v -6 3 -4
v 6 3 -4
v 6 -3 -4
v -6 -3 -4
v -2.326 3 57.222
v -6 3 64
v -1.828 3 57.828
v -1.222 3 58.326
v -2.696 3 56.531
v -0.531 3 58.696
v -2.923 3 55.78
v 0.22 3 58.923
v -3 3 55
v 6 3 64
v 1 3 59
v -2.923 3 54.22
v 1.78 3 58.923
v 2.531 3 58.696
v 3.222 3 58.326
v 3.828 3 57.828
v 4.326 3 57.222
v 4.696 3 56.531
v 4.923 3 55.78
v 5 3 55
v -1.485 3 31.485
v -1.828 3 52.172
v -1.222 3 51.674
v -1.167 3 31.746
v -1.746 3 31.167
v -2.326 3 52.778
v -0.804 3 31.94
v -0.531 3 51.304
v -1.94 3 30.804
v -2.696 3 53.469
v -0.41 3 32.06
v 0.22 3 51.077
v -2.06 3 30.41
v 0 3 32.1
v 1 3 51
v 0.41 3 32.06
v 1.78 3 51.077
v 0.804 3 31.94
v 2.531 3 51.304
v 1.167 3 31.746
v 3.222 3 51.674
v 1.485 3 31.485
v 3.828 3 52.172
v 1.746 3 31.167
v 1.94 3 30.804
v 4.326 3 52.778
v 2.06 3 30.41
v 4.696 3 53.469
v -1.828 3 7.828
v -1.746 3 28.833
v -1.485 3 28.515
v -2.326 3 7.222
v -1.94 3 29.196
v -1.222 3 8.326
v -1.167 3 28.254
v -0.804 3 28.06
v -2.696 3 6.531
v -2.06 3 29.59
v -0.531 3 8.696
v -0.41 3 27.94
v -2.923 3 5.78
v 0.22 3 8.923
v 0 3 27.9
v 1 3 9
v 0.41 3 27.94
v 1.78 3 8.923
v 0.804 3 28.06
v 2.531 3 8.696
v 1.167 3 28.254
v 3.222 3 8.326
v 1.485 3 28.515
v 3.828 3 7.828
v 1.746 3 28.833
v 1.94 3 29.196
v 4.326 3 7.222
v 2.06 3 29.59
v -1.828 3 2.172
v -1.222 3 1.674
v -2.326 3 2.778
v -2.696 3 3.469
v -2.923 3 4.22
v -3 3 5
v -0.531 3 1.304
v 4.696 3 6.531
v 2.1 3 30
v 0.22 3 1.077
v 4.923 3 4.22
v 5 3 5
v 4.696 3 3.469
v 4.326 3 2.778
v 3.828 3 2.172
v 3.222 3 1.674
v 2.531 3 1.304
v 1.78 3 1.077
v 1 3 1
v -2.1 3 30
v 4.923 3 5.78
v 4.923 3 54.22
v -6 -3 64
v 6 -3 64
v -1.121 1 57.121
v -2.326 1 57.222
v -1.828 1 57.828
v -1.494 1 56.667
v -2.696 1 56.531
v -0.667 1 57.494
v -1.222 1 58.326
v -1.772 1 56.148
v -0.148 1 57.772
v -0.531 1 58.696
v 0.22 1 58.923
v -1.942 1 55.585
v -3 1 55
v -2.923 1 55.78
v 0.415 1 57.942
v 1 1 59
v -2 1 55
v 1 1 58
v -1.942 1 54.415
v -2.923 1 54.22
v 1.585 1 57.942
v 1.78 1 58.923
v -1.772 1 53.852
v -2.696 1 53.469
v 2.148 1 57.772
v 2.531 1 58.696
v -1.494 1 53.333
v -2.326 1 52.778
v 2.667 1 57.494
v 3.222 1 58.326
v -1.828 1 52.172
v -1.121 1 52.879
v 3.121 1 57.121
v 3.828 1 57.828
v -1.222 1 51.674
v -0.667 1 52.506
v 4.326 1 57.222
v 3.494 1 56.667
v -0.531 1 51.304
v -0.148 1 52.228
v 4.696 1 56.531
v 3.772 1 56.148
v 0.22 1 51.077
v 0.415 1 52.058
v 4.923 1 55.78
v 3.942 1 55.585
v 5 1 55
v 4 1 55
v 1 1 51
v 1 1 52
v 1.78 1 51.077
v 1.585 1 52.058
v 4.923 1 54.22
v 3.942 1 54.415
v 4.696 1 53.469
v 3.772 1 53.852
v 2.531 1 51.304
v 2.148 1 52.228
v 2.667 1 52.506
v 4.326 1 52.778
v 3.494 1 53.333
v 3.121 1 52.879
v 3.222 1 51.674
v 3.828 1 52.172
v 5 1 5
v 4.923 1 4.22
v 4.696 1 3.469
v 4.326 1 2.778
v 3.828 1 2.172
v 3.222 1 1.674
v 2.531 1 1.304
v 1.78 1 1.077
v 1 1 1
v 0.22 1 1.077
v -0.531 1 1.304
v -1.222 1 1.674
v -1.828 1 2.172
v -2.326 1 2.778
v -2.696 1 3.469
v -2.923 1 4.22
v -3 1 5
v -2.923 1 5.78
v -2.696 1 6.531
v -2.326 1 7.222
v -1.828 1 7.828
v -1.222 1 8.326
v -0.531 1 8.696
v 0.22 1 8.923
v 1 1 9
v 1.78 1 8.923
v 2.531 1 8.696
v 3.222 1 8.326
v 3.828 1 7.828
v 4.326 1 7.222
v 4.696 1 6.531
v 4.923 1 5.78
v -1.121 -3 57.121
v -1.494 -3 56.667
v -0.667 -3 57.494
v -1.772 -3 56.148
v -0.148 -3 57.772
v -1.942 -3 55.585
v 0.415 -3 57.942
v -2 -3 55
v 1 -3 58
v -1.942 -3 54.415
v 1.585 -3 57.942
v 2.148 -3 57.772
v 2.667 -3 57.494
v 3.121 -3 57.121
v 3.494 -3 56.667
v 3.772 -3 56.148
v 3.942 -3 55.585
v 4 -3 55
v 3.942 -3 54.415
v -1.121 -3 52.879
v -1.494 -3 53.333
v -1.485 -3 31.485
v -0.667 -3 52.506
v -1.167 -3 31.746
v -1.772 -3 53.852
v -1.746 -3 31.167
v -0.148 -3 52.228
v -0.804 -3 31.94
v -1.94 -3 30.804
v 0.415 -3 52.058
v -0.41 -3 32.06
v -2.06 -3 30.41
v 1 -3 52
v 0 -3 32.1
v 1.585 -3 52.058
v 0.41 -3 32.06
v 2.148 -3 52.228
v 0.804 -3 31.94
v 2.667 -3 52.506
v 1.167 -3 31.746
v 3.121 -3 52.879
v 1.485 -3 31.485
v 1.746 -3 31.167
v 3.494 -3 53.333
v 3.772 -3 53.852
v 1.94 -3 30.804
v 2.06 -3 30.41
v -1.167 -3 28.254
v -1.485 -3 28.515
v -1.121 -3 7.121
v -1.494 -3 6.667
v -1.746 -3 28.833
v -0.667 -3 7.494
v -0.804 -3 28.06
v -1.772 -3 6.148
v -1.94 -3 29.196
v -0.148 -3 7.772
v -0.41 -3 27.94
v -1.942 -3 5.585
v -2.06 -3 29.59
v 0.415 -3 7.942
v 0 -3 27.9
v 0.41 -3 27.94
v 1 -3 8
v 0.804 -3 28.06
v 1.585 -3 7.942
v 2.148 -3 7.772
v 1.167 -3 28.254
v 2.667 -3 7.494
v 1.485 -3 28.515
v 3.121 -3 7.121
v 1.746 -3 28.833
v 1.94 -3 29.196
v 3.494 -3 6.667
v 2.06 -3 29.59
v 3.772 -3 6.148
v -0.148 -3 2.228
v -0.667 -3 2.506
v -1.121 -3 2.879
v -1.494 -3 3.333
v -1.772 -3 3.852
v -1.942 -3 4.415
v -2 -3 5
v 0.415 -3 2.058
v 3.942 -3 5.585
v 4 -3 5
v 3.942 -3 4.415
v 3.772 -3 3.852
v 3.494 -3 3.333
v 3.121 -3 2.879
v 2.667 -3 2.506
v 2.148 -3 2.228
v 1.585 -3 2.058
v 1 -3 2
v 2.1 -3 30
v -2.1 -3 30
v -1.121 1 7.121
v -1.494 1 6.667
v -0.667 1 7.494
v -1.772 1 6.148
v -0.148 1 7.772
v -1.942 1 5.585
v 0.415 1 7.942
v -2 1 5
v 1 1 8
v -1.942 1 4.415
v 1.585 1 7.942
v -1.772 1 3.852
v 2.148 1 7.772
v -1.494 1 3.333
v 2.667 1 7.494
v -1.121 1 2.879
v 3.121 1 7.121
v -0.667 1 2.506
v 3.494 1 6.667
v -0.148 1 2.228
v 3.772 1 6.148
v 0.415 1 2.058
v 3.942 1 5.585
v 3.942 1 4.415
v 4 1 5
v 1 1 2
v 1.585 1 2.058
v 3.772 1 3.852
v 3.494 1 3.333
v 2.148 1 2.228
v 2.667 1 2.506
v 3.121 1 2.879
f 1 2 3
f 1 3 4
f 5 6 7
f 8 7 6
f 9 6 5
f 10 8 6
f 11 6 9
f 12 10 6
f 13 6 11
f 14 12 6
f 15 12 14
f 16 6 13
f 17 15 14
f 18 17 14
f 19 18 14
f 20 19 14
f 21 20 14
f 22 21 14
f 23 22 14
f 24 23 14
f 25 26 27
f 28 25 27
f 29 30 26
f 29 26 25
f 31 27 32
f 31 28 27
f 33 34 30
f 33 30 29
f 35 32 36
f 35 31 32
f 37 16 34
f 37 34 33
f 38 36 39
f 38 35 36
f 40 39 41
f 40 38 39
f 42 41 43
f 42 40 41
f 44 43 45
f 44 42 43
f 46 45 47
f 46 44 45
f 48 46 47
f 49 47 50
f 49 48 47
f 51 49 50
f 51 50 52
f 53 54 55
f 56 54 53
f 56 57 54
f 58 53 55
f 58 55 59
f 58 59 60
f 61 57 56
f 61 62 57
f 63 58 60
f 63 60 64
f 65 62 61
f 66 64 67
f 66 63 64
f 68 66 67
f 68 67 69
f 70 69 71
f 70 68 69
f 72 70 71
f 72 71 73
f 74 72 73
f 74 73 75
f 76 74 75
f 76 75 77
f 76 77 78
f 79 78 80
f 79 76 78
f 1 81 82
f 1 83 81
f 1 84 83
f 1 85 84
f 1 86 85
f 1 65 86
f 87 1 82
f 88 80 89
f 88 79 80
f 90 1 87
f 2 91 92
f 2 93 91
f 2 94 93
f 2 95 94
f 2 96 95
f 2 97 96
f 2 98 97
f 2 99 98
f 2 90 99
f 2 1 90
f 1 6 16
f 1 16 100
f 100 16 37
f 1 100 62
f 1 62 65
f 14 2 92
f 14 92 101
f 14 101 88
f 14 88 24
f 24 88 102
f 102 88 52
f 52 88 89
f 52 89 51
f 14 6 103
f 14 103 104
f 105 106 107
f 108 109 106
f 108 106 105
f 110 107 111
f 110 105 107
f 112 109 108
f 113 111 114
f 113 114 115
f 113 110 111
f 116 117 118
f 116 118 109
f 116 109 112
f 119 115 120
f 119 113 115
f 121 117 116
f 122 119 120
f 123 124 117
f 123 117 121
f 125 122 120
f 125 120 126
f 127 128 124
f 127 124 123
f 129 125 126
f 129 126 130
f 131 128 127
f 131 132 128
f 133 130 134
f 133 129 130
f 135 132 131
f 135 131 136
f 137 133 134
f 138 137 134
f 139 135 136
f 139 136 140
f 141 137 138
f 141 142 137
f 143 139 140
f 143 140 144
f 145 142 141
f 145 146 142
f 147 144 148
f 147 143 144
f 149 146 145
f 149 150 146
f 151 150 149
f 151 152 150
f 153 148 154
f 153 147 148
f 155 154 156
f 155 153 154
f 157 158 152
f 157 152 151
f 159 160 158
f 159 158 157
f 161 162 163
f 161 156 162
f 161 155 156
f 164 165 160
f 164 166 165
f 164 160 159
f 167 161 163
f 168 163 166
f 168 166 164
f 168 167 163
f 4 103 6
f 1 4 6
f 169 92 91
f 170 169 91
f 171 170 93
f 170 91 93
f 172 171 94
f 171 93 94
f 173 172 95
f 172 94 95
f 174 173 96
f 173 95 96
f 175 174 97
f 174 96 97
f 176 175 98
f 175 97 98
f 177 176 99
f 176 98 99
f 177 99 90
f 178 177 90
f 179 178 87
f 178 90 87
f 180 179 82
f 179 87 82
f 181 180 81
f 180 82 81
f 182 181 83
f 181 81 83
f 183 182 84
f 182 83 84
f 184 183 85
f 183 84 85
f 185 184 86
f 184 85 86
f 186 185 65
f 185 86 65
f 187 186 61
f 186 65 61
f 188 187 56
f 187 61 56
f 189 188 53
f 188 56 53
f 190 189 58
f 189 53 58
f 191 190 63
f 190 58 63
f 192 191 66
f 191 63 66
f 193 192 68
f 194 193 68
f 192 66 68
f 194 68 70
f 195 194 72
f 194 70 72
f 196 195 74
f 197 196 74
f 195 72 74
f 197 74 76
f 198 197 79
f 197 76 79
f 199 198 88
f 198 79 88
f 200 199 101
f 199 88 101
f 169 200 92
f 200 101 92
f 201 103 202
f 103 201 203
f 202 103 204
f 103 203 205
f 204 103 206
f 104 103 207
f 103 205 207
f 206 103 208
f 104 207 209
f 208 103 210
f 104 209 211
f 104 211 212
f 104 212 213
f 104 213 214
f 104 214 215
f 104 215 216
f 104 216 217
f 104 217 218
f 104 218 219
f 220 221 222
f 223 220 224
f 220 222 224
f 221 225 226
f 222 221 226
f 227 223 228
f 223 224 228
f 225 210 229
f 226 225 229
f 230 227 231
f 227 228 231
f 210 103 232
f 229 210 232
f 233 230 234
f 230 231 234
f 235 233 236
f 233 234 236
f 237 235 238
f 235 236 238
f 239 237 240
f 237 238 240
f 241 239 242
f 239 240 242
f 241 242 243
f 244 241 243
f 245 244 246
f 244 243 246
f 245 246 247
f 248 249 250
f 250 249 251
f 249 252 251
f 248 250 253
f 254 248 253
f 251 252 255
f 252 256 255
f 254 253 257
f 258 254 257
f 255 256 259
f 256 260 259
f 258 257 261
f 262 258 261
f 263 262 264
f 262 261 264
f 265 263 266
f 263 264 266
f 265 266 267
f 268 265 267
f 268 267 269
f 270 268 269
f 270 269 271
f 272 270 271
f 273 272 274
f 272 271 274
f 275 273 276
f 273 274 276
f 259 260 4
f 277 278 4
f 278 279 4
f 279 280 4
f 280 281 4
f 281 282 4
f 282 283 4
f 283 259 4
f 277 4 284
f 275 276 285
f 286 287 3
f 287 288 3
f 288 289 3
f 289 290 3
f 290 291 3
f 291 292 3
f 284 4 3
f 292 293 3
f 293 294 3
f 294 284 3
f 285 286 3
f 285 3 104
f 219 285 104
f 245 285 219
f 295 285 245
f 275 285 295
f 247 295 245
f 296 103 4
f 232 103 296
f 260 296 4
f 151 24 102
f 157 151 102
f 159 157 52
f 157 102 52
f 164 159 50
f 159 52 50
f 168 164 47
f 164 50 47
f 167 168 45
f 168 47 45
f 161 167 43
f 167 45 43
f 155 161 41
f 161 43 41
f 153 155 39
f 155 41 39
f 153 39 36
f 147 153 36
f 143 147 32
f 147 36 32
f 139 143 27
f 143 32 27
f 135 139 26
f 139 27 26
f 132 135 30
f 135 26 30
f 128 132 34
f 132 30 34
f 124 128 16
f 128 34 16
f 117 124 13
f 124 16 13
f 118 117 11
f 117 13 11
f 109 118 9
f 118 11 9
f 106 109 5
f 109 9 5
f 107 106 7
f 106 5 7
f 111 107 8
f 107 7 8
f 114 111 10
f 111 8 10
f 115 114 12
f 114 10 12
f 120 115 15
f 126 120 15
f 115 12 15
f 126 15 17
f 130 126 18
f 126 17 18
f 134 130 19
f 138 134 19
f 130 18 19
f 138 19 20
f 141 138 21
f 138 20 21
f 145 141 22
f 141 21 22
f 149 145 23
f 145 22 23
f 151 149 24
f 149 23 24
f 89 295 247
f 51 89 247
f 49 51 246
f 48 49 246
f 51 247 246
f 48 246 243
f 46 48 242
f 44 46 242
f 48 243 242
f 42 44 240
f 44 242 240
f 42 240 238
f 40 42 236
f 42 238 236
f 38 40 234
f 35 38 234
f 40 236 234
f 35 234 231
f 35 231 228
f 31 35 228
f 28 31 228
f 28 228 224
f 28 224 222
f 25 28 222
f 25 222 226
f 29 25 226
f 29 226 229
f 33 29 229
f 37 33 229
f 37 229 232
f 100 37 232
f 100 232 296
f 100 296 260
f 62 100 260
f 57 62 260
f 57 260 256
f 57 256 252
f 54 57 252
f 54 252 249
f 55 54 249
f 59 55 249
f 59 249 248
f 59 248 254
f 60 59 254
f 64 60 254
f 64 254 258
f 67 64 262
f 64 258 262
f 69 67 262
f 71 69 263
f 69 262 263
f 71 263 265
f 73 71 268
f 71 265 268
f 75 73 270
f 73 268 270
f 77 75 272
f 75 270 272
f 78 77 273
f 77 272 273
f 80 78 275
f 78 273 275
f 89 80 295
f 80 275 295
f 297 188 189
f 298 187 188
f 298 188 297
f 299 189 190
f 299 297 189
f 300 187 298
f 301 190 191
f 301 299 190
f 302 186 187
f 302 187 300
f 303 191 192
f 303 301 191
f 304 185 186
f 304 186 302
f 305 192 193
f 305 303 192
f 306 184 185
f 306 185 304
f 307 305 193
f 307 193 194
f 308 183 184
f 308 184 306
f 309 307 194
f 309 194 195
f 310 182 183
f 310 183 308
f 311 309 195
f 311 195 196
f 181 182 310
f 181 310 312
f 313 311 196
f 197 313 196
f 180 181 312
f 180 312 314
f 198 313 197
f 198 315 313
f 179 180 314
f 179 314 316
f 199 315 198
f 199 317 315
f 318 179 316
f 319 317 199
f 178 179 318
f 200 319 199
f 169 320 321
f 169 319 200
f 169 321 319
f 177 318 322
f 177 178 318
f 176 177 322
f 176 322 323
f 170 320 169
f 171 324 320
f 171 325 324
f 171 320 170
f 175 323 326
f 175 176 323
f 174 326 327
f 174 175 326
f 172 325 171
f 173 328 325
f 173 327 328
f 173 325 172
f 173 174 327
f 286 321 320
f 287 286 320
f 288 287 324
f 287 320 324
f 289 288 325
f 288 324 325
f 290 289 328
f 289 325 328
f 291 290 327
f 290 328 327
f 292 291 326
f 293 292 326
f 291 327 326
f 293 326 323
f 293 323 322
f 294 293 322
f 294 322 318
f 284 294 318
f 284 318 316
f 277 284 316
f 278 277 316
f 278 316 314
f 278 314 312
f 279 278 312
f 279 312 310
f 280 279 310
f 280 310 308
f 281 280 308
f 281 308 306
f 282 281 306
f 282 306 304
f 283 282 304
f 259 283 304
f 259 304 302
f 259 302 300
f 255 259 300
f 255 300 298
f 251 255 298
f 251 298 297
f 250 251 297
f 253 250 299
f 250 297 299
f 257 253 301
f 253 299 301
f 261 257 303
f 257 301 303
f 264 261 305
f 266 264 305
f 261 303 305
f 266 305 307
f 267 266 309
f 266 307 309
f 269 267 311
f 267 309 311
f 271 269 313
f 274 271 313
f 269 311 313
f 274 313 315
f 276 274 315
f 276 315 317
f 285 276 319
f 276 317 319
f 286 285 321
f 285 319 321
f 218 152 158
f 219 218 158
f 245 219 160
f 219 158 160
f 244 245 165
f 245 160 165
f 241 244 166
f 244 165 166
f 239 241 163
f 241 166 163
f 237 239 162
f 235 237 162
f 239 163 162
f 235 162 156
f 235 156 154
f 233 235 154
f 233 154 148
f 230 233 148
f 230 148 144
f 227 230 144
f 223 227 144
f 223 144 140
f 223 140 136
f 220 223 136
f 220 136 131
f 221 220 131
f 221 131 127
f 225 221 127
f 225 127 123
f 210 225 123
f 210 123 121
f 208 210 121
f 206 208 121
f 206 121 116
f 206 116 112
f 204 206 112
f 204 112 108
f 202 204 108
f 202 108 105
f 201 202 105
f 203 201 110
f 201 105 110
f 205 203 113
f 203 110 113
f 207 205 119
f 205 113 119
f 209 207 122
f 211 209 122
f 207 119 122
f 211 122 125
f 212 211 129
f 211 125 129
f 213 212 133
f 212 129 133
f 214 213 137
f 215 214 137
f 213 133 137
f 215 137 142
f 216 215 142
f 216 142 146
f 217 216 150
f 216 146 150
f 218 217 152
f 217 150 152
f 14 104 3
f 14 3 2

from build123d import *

# Parameters (mm, degrees)
SKETCH1_W             = 12
SKETCH1_H             = 6
BOSS_EXTRUDE1_DEPTH   = 60
SKETCH2_R             = 3
CUT_EXTRUDE1_DEPTH    = 7
SKETCH3_R             = 4
CUT_EXTRUDE2_DEPTH    = 2
SKETCH4_W             = 12
SKETCH4_H             = 6
BOSS_EXTRUDE2_DEPTH   = 4
SKETCH5_W             = 12
SKETCH5_H             = 6
BOSS_EXTRUDE3_DEPTH   = 4
M5_TAPPED_HOLE1_D     = 4.2
M5_TAPPED_HOLE1_DEPTH = 52
M5_TAPPED_HOLE1_TIP   = 1.2618073


with BuildPart() as part:
    # Sketch1 → Boss-Extrude1 (new body)
    with BuildSketch(Plane.XY):
        Rectangle(SKETCH1_W, SKETCH1_H)
    extrude(amount=BOSS_EXTRUDE1_DEPTH)

    # Sketch2 → Cut-Extrude1 (cut, through all)
    with BuildSketch(Plane(origin=(0, 3, 0), x_dir=(1, 0, 0), z_dir=(0, 1, 0))):
        with Locations((1, -5)):
            Circle(SKETCH2_R)
        with Locations((1, -55)):
            Circle(SKETCH2_R)
    extrude(amount=-CUT_EXTRUDE1_DEPTH, mode=Mode.SUBTRACT)

    # Sketch3 → Cut-Extrude2 (cut)
    with BuildSketch(Plane(origin=(0, 3, 0), x_dir=(1, 0, 0), z_dir=(0, 1, 0))):
        with Locations((1, -5)):
            Circle(SKETCH3_R)
        with Locations((1, -55)):
            Circle(SKETCH3_R)
    extrude(amount=-CUT_EXTRUDE2_DEPTH, mode=Mode.SUBTRACT)

    # Sketch4 → Boss-Extrude2 (add)
    with BuildSketch(Plane(origin=(0, 0, 0), x_dir=(-1, 0, 0), z_dir=(0, 0, -1))):
        Rectangle(SKETCH4_W, SKETCH4_H)
    extrude(amount=BOSS_EXTRUDE2_DEPTH)

    # Sketch5 → Boss-Extrude3 (add)
    with BuildSketch(Plane.XY.offset(60)):
        Rectangle(SKETCH5_W, SKETCH5_H)
    extrude(amount=BOSS_EXTRUDE3_DEPTH)

    # M5 Tapped Hole1
    with Locations(Plane(origin=(0, 3, 0), x_dir=(-1, 0, 0), z_dir=(0, 1, 0))):
        with Locations((0, 30)):
            Hole(M5_TAPPED_HOLE1_D / 2, depth=M5_TAPPED_HOLE1_DEPTH)
            with Locations((0, 0, -(M5_TAPPED_HOLE1_DEPTH + M5_TAPPED_HOLE1_TIP / 2))):  # 118° drill point
                Cone(0, M5_TAPPED_HOLE1_D / 2, M5_TAPPED_HOLE1_TIP, mode=Mode.SUBTRACT)


solid = part.part
